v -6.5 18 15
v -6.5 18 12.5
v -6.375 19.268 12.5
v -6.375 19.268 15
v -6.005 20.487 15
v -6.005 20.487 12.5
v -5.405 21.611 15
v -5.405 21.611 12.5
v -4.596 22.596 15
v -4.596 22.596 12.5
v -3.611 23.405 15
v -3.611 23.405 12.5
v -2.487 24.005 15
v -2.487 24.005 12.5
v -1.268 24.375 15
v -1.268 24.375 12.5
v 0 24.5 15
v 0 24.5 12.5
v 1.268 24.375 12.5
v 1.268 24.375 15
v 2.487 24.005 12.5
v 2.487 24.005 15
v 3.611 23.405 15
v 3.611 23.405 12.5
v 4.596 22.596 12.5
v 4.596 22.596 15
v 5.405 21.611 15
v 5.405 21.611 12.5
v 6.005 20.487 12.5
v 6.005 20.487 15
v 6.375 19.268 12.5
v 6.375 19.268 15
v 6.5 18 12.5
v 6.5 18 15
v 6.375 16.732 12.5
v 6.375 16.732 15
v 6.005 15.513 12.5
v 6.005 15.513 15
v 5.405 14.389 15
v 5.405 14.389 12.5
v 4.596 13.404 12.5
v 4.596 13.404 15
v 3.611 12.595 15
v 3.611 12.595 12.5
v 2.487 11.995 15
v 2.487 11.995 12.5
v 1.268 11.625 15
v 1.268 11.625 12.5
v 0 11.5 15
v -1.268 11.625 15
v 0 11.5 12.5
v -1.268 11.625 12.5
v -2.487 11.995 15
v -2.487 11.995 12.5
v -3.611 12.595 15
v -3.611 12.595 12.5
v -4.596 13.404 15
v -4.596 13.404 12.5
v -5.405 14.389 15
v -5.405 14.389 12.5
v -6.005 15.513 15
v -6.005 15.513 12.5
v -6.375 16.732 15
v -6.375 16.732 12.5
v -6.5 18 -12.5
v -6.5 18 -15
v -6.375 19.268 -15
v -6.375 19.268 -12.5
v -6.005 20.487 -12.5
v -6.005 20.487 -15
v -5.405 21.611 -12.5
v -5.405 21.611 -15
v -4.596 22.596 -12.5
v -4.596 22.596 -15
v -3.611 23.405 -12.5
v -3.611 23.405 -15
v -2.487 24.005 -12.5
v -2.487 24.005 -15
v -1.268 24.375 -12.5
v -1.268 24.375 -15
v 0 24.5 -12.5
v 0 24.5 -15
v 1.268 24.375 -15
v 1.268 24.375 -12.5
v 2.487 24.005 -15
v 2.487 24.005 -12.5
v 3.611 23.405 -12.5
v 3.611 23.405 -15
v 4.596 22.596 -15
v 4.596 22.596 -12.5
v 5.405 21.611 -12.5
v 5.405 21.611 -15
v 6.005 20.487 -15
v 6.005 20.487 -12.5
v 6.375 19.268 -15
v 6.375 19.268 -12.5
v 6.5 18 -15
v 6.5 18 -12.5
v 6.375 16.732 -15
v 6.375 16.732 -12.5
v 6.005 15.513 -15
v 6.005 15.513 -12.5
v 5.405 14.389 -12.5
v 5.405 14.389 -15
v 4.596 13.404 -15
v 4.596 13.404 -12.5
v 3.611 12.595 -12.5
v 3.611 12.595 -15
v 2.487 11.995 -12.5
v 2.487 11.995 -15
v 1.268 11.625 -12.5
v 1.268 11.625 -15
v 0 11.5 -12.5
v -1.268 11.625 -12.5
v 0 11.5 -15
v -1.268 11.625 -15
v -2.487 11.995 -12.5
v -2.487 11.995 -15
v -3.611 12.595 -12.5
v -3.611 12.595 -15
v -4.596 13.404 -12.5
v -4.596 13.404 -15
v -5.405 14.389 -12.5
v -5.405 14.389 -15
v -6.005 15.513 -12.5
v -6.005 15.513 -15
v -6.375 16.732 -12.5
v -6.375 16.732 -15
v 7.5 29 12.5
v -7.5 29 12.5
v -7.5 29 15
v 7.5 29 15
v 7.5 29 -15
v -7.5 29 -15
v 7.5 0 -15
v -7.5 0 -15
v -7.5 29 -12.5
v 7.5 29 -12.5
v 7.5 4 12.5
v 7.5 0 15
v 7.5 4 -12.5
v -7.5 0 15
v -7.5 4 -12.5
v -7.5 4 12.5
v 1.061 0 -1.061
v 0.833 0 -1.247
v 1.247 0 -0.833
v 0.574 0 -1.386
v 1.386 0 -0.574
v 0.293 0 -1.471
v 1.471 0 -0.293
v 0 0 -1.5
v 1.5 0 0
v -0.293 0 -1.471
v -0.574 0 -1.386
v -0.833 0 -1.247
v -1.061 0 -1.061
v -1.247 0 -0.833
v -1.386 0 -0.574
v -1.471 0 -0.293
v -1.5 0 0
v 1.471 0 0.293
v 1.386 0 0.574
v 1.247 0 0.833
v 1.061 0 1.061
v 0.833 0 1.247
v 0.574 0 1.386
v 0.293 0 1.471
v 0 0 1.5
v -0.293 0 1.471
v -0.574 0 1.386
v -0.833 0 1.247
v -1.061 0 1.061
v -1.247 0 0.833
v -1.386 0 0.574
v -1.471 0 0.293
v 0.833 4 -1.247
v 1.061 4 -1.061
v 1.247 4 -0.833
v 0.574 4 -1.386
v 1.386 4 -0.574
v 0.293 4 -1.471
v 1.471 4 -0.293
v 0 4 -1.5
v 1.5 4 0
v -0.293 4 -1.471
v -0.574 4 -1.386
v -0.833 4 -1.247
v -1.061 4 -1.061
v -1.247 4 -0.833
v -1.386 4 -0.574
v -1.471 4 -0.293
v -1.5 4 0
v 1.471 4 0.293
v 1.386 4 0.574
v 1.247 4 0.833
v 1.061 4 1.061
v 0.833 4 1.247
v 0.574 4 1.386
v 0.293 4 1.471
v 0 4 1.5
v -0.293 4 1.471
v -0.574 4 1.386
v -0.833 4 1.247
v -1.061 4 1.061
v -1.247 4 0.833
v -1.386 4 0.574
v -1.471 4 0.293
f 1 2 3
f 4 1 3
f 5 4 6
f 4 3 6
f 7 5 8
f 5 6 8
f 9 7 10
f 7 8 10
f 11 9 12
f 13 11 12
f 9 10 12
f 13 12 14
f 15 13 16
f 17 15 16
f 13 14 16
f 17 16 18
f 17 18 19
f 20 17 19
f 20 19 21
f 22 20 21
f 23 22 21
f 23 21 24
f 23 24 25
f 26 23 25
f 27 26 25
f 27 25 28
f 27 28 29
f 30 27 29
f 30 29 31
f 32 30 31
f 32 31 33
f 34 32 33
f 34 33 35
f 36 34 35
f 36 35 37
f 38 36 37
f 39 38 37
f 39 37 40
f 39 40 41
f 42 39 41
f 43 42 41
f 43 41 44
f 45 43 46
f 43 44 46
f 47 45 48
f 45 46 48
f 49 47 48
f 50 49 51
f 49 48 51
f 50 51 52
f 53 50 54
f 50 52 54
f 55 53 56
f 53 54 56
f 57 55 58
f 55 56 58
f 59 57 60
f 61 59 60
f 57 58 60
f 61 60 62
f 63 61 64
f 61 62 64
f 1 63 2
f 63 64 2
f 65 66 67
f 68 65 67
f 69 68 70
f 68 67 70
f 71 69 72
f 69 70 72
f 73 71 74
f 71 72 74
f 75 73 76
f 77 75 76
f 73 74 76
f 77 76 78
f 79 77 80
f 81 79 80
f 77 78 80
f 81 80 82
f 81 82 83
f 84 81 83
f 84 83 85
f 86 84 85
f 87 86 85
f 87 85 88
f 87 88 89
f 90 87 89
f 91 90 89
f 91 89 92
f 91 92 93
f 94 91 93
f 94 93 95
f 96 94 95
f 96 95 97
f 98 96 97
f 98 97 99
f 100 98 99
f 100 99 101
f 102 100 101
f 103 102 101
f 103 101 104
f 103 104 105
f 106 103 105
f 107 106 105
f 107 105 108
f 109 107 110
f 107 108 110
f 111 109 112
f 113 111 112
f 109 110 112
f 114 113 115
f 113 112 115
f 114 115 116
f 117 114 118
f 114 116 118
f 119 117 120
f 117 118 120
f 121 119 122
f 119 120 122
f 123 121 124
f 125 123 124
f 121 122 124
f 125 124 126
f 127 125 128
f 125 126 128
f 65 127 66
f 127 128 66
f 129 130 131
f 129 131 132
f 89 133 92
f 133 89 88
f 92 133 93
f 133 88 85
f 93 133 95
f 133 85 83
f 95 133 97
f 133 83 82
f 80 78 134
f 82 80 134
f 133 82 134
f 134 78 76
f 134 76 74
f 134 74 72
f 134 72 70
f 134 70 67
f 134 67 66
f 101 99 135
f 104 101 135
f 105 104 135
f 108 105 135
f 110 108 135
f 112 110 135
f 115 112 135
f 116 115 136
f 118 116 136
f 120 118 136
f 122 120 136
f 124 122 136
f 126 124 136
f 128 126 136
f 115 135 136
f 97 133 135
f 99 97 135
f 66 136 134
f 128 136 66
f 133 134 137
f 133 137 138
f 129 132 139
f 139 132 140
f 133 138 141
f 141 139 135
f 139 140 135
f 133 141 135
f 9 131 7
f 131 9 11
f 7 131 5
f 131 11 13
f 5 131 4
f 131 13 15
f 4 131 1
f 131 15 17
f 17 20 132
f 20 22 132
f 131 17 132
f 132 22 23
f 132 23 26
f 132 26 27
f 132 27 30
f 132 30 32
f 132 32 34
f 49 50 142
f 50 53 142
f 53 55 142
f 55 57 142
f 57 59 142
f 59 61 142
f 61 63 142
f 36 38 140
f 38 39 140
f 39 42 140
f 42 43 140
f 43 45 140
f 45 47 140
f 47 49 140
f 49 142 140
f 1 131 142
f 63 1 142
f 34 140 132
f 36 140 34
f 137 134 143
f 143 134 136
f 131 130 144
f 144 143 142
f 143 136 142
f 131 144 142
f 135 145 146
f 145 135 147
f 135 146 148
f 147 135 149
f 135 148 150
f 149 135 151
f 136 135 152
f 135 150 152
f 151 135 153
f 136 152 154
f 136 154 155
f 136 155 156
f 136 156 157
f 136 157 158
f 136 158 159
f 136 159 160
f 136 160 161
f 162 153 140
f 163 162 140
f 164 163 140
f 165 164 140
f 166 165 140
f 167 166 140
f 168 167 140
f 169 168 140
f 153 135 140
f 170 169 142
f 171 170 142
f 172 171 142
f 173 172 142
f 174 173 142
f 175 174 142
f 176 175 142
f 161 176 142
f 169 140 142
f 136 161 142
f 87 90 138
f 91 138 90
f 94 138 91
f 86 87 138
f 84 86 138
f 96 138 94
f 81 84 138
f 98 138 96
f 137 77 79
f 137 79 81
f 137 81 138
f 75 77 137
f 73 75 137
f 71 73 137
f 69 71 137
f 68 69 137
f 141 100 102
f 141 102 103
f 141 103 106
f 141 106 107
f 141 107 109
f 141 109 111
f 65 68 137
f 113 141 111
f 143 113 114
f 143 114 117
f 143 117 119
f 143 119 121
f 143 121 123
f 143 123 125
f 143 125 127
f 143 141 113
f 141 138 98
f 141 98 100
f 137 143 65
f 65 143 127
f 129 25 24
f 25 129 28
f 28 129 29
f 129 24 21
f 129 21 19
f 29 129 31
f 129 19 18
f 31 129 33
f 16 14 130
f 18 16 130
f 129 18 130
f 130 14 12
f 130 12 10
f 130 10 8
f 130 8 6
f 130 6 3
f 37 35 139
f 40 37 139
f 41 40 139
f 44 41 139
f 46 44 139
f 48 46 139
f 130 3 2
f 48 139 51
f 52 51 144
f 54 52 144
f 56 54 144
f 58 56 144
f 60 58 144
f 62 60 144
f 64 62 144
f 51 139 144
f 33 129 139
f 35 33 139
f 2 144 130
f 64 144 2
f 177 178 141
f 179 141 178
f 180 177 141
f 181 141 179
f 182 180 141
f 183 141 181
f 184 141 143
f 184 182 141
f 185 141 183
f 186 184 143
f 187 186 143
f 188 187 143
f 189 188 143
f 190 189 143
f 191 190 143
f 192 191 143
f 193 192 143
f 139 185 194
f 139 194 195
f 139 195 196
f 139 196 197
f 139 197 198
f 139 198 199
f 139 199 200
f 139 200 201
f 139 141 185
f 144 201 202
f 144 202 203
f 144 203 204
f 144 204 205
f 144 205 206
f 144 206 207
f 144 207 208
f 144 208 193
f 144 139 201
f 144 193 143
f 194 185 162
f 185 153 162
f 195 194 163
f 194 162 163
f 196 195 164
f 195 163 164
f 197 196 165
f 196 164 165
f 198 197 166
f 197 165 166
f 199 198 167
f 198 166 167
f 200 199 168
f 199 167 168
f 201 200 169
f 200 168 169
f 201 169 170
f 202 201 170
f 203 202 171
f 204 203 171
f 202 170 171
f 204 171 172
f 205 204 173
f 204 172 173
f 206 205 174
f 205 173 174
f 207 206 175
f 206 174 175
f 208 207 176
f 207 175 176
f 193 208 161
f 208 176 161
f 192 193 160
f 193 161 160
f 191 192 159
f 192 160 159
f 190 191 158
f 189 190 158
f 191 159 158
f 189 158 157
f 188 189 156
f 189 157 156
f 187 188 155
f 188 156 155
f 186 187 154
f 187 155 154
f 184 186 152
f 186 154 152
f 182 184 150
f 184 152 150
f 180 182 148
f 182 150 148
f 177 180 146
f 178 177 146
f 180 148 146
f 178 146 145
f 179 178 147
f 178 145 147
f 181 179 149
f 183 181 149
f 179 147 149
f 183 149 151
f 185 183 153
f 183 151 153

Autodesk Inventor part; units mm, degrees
ref_plane "YZ Plane" through (0, 0, 0) normal (1, 0, 0) x (0, 1, 0)
ref_plane "XZ Plane" through (0, 0, 0) normal (0, 1, 0) x (-1, 0, 0)
ref_plane "XY Plane" through (0, 0, 0) normal (0, 0, 1) x (1, 0, 0)
sketch "Sketch1" plane through (0, 0, 0) normal (0, 1, 0) x (-1, 0, 0)
  line L0 (-7.5, -15) -> (7.5, -15)
  line L1 (7.5, -15) -> (7.5, 15)
  line L2 (7.5, 15) -> (-7.5, 15)
  line L3 (-7.5, 15) -> (-7.5, -15)
  line L4 (-7.5, -15) -> (7.5, 15) construction
  line L5 (7.5, -15) -> (-7.5, 15) construction
  point P0 (0, 0)
  dimension "d0" = 15
  dimension "d1" = 30
extrude "Extrusion1" add sketch "Sketch1" along normal blind 4
sketch "Sketch2" plane through (0, 4, 0) normal (0, 1, 0) x (1, 0, 0)
  line L0 (-7.5, 15) -> (-7.5, -15) projected
  line L1 (7.5, -15) -> (7.5, 15) projected
  line L2 (-7.5, 15) -> (7.5, 15)
  line L3 (7.5, 15) -> (7.5, 12.5)
  line L4 (7.5, 12.5) -> (-7.5, 12.5)
  line L5 (-7.5, 12.5) -> (-7.5, 15)
  line L6 (7.5, 0) -> (0, 0) construction
  line L7 (-7.5, -15) -> (-7.5, 15)
  line L8 (7.5, 15) -> (7.5, -15)
  line L9 (-7.5, -15) -> (7.5, -15)
  line L10 (7.5, -12.5) -> (-7.5, -12.5)
  point P0 (7.5, 15)
  point P1 (7.5, -15)
  point P2 (7.5, -12.5)
  dimension "d4" = 2.5
extrude "Extrusion2" add sketch "Sketch2" along normal blind 25 contours L2 L1 L4 L0 | L10 L1 L9 L0
sketch "Sketch4" plane through (7.5, 0, -15) normal (0, 0, -1) x (-1, 0, 0)
  line L0 (7.5, 0) -> (7.5, 7) construction
  line L1 (0, 0) -> (0, 29) construction
  line L2 (15, 4) -> (15, 29) construction
  line L3 (0, 4) -> (0, 29) construction
  line L4 (15, 7) -> (0, 7) construction
  line L5 (0, 29) -> (15, 29) construction
  line L6 (15, 29) -> (0, 7) construction
  line L7 (0, 29) -> (15, 7) construction
  circle A0 centre (7.5, 18) radius 6.5
  line L8 (7.5, 0) -> (7.5, 18) construction
  line L9 (15, 0) -> (0, 0) construction
  dimension "d12" = 7
  dimension "d13" = 13
  dimension "d14" = 34.287
extrude "Extrusion4" cut sketch "Sketch4" against normal blind 30
sketch "Sketch5" plane through (0, 0, 0) normal (0, -1, 0) x (1, 0, 0)
  line L0 (-7.5, 15) -> (7.5, 15) construction
  line L1 (-7.5, 15) -> (7.5, -15) construction
  line L2 (7.5, 15) -> (-7.5, -15) construction
  circle A0 centre (0, 0) radius 1.5
  dimension "d17" = 3
extrude "Extrusion5" cut sketch "Sketch5" against normal blind 5
properties part number "llanta_1"
